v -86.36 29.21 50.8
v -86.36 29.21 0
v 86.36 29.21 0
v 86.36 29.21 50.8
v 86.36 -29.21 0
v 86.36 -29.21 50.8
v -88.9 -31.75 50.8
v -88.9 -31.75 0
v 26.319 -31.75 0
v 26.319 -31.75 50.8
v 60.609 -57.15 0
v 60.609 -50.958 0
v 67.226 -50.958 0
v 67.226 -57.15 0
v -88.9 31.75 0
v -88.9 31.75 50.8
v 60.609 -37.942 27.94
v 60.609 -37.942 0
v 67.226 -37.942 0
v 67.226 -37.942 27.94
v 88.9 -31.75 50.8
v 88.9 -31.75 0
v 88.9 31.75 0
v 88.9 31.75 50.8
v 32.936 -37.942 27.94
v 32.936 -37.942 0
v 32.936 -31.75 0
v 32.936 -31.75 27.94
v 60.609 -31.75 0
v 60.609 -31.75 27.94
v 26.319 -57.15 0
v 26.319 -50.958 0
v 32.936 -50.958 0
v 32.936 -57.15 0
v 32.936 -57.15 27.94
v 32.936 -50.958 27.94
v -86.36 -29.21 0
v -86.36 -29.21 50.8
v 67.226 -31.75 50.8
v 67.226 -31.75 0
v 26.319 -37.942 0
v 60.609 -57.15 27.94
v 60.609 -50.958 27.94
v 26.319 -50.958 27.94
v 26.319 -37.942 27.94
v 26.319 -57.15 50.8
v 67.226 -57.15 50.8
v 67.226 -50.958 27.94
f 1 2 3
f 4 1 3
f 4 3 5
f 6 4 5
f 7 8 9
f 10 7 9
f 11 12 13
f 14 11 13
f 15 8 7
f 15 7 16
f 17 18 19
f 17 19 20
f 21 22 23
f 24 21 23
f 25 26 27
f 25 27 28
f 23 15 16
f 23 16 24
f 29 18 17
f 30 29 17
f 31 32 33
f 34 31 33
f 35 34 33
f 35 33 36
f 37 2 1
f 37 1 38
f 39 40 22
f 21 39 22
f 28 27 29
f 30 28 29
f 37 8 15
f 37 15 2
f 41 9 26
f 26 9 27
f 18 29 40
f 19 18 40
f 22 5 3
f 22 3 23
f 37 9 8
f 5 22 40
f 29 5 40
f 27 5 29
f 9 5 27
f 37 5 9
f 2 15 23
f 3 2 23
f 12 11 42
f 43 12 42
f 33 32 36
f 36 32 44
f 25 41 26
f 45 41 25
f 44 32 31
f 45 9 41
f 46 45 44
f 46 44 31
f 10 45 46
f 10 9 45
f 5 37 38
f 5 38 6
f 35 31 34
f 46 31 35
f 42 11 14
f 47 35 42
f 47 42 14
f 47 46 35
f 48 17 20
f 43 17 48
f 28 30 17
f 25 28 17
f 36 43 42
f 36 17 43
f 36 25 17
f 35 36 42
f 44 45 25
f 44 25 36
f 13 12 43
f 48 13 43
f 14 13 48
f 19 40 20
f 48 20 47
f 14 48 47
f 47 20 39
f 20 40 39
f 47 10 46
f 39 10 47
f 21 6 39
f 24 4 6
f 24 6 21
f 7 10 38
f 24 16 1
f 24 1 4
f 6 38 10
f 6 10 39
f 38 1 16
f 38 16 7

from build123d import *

# Parameters (mm, degrees)
F0_W     = 177.8
F0_H     = 63.5
F1_DEPTH = 50.8
F2_W     = 40.907368
F2_H     = 50.8
F3_DEPTH = 25.4
F4_W     = 27.672634
F4_H     = 27.94
F5_DEPTH = 25.4
F6_W     = 13.016606
F6_H     = 27.94
F7_DEPTH = 45.466
F8_W     = 172.72
F8_H     = 58.42
F9_DEPTH = 74.93


with BuildPart() as f1:
    # F0 (on Top) → F1 (new body)
    with BuildSketch(Plane.XY):
        Rectangle(F0_W, F0_H)
    extrude(amount=F1_DEPTH)

    # F2 (on face) → F3 (join)
    with BuildSketch(Plane.XZ.offset(31.75)):
        with Locations((46.772763, 25.4)):
            Rectangle(F2_W, F2_H)
    extrude(amount=F3_DEPTH)

    # F4 (on face) → F5 (cut)
    with BuildSketch(Plane.XZ.offset(57.15)):
        with Locations((46.772763, 13.97)):
            Rectangle(F4_W, F4_H)
    extrude(amount=-F5_DEPTH, mode=Mode.SUBTRACT)

    # F6 (on face) → F7 (cut)
    with BuildSketch(Plane(origin=(26.319079, 0, 0), x_dir=(0, -1, 0), z_dir=(-1, 0, 0))):
        with Locations((44.45, 13.97)):
            Rectangle(F6_W, F6_H)
    extrude(amount=-F7_DEPTH, mode=Mode.SUBTRACT)

    # F8 (on face) → F9 (cut)
    with BuildSketch(Plane(origin=(0, 0, 0), x_dir=(1, 0, 0), z_dir=(0, 0, -1))):
        Rectangle(F8_W, F8_H)
    extrude(amount=-F9_DEPTH, mode=Mode.SUBTRACT)


solid = f1.part
